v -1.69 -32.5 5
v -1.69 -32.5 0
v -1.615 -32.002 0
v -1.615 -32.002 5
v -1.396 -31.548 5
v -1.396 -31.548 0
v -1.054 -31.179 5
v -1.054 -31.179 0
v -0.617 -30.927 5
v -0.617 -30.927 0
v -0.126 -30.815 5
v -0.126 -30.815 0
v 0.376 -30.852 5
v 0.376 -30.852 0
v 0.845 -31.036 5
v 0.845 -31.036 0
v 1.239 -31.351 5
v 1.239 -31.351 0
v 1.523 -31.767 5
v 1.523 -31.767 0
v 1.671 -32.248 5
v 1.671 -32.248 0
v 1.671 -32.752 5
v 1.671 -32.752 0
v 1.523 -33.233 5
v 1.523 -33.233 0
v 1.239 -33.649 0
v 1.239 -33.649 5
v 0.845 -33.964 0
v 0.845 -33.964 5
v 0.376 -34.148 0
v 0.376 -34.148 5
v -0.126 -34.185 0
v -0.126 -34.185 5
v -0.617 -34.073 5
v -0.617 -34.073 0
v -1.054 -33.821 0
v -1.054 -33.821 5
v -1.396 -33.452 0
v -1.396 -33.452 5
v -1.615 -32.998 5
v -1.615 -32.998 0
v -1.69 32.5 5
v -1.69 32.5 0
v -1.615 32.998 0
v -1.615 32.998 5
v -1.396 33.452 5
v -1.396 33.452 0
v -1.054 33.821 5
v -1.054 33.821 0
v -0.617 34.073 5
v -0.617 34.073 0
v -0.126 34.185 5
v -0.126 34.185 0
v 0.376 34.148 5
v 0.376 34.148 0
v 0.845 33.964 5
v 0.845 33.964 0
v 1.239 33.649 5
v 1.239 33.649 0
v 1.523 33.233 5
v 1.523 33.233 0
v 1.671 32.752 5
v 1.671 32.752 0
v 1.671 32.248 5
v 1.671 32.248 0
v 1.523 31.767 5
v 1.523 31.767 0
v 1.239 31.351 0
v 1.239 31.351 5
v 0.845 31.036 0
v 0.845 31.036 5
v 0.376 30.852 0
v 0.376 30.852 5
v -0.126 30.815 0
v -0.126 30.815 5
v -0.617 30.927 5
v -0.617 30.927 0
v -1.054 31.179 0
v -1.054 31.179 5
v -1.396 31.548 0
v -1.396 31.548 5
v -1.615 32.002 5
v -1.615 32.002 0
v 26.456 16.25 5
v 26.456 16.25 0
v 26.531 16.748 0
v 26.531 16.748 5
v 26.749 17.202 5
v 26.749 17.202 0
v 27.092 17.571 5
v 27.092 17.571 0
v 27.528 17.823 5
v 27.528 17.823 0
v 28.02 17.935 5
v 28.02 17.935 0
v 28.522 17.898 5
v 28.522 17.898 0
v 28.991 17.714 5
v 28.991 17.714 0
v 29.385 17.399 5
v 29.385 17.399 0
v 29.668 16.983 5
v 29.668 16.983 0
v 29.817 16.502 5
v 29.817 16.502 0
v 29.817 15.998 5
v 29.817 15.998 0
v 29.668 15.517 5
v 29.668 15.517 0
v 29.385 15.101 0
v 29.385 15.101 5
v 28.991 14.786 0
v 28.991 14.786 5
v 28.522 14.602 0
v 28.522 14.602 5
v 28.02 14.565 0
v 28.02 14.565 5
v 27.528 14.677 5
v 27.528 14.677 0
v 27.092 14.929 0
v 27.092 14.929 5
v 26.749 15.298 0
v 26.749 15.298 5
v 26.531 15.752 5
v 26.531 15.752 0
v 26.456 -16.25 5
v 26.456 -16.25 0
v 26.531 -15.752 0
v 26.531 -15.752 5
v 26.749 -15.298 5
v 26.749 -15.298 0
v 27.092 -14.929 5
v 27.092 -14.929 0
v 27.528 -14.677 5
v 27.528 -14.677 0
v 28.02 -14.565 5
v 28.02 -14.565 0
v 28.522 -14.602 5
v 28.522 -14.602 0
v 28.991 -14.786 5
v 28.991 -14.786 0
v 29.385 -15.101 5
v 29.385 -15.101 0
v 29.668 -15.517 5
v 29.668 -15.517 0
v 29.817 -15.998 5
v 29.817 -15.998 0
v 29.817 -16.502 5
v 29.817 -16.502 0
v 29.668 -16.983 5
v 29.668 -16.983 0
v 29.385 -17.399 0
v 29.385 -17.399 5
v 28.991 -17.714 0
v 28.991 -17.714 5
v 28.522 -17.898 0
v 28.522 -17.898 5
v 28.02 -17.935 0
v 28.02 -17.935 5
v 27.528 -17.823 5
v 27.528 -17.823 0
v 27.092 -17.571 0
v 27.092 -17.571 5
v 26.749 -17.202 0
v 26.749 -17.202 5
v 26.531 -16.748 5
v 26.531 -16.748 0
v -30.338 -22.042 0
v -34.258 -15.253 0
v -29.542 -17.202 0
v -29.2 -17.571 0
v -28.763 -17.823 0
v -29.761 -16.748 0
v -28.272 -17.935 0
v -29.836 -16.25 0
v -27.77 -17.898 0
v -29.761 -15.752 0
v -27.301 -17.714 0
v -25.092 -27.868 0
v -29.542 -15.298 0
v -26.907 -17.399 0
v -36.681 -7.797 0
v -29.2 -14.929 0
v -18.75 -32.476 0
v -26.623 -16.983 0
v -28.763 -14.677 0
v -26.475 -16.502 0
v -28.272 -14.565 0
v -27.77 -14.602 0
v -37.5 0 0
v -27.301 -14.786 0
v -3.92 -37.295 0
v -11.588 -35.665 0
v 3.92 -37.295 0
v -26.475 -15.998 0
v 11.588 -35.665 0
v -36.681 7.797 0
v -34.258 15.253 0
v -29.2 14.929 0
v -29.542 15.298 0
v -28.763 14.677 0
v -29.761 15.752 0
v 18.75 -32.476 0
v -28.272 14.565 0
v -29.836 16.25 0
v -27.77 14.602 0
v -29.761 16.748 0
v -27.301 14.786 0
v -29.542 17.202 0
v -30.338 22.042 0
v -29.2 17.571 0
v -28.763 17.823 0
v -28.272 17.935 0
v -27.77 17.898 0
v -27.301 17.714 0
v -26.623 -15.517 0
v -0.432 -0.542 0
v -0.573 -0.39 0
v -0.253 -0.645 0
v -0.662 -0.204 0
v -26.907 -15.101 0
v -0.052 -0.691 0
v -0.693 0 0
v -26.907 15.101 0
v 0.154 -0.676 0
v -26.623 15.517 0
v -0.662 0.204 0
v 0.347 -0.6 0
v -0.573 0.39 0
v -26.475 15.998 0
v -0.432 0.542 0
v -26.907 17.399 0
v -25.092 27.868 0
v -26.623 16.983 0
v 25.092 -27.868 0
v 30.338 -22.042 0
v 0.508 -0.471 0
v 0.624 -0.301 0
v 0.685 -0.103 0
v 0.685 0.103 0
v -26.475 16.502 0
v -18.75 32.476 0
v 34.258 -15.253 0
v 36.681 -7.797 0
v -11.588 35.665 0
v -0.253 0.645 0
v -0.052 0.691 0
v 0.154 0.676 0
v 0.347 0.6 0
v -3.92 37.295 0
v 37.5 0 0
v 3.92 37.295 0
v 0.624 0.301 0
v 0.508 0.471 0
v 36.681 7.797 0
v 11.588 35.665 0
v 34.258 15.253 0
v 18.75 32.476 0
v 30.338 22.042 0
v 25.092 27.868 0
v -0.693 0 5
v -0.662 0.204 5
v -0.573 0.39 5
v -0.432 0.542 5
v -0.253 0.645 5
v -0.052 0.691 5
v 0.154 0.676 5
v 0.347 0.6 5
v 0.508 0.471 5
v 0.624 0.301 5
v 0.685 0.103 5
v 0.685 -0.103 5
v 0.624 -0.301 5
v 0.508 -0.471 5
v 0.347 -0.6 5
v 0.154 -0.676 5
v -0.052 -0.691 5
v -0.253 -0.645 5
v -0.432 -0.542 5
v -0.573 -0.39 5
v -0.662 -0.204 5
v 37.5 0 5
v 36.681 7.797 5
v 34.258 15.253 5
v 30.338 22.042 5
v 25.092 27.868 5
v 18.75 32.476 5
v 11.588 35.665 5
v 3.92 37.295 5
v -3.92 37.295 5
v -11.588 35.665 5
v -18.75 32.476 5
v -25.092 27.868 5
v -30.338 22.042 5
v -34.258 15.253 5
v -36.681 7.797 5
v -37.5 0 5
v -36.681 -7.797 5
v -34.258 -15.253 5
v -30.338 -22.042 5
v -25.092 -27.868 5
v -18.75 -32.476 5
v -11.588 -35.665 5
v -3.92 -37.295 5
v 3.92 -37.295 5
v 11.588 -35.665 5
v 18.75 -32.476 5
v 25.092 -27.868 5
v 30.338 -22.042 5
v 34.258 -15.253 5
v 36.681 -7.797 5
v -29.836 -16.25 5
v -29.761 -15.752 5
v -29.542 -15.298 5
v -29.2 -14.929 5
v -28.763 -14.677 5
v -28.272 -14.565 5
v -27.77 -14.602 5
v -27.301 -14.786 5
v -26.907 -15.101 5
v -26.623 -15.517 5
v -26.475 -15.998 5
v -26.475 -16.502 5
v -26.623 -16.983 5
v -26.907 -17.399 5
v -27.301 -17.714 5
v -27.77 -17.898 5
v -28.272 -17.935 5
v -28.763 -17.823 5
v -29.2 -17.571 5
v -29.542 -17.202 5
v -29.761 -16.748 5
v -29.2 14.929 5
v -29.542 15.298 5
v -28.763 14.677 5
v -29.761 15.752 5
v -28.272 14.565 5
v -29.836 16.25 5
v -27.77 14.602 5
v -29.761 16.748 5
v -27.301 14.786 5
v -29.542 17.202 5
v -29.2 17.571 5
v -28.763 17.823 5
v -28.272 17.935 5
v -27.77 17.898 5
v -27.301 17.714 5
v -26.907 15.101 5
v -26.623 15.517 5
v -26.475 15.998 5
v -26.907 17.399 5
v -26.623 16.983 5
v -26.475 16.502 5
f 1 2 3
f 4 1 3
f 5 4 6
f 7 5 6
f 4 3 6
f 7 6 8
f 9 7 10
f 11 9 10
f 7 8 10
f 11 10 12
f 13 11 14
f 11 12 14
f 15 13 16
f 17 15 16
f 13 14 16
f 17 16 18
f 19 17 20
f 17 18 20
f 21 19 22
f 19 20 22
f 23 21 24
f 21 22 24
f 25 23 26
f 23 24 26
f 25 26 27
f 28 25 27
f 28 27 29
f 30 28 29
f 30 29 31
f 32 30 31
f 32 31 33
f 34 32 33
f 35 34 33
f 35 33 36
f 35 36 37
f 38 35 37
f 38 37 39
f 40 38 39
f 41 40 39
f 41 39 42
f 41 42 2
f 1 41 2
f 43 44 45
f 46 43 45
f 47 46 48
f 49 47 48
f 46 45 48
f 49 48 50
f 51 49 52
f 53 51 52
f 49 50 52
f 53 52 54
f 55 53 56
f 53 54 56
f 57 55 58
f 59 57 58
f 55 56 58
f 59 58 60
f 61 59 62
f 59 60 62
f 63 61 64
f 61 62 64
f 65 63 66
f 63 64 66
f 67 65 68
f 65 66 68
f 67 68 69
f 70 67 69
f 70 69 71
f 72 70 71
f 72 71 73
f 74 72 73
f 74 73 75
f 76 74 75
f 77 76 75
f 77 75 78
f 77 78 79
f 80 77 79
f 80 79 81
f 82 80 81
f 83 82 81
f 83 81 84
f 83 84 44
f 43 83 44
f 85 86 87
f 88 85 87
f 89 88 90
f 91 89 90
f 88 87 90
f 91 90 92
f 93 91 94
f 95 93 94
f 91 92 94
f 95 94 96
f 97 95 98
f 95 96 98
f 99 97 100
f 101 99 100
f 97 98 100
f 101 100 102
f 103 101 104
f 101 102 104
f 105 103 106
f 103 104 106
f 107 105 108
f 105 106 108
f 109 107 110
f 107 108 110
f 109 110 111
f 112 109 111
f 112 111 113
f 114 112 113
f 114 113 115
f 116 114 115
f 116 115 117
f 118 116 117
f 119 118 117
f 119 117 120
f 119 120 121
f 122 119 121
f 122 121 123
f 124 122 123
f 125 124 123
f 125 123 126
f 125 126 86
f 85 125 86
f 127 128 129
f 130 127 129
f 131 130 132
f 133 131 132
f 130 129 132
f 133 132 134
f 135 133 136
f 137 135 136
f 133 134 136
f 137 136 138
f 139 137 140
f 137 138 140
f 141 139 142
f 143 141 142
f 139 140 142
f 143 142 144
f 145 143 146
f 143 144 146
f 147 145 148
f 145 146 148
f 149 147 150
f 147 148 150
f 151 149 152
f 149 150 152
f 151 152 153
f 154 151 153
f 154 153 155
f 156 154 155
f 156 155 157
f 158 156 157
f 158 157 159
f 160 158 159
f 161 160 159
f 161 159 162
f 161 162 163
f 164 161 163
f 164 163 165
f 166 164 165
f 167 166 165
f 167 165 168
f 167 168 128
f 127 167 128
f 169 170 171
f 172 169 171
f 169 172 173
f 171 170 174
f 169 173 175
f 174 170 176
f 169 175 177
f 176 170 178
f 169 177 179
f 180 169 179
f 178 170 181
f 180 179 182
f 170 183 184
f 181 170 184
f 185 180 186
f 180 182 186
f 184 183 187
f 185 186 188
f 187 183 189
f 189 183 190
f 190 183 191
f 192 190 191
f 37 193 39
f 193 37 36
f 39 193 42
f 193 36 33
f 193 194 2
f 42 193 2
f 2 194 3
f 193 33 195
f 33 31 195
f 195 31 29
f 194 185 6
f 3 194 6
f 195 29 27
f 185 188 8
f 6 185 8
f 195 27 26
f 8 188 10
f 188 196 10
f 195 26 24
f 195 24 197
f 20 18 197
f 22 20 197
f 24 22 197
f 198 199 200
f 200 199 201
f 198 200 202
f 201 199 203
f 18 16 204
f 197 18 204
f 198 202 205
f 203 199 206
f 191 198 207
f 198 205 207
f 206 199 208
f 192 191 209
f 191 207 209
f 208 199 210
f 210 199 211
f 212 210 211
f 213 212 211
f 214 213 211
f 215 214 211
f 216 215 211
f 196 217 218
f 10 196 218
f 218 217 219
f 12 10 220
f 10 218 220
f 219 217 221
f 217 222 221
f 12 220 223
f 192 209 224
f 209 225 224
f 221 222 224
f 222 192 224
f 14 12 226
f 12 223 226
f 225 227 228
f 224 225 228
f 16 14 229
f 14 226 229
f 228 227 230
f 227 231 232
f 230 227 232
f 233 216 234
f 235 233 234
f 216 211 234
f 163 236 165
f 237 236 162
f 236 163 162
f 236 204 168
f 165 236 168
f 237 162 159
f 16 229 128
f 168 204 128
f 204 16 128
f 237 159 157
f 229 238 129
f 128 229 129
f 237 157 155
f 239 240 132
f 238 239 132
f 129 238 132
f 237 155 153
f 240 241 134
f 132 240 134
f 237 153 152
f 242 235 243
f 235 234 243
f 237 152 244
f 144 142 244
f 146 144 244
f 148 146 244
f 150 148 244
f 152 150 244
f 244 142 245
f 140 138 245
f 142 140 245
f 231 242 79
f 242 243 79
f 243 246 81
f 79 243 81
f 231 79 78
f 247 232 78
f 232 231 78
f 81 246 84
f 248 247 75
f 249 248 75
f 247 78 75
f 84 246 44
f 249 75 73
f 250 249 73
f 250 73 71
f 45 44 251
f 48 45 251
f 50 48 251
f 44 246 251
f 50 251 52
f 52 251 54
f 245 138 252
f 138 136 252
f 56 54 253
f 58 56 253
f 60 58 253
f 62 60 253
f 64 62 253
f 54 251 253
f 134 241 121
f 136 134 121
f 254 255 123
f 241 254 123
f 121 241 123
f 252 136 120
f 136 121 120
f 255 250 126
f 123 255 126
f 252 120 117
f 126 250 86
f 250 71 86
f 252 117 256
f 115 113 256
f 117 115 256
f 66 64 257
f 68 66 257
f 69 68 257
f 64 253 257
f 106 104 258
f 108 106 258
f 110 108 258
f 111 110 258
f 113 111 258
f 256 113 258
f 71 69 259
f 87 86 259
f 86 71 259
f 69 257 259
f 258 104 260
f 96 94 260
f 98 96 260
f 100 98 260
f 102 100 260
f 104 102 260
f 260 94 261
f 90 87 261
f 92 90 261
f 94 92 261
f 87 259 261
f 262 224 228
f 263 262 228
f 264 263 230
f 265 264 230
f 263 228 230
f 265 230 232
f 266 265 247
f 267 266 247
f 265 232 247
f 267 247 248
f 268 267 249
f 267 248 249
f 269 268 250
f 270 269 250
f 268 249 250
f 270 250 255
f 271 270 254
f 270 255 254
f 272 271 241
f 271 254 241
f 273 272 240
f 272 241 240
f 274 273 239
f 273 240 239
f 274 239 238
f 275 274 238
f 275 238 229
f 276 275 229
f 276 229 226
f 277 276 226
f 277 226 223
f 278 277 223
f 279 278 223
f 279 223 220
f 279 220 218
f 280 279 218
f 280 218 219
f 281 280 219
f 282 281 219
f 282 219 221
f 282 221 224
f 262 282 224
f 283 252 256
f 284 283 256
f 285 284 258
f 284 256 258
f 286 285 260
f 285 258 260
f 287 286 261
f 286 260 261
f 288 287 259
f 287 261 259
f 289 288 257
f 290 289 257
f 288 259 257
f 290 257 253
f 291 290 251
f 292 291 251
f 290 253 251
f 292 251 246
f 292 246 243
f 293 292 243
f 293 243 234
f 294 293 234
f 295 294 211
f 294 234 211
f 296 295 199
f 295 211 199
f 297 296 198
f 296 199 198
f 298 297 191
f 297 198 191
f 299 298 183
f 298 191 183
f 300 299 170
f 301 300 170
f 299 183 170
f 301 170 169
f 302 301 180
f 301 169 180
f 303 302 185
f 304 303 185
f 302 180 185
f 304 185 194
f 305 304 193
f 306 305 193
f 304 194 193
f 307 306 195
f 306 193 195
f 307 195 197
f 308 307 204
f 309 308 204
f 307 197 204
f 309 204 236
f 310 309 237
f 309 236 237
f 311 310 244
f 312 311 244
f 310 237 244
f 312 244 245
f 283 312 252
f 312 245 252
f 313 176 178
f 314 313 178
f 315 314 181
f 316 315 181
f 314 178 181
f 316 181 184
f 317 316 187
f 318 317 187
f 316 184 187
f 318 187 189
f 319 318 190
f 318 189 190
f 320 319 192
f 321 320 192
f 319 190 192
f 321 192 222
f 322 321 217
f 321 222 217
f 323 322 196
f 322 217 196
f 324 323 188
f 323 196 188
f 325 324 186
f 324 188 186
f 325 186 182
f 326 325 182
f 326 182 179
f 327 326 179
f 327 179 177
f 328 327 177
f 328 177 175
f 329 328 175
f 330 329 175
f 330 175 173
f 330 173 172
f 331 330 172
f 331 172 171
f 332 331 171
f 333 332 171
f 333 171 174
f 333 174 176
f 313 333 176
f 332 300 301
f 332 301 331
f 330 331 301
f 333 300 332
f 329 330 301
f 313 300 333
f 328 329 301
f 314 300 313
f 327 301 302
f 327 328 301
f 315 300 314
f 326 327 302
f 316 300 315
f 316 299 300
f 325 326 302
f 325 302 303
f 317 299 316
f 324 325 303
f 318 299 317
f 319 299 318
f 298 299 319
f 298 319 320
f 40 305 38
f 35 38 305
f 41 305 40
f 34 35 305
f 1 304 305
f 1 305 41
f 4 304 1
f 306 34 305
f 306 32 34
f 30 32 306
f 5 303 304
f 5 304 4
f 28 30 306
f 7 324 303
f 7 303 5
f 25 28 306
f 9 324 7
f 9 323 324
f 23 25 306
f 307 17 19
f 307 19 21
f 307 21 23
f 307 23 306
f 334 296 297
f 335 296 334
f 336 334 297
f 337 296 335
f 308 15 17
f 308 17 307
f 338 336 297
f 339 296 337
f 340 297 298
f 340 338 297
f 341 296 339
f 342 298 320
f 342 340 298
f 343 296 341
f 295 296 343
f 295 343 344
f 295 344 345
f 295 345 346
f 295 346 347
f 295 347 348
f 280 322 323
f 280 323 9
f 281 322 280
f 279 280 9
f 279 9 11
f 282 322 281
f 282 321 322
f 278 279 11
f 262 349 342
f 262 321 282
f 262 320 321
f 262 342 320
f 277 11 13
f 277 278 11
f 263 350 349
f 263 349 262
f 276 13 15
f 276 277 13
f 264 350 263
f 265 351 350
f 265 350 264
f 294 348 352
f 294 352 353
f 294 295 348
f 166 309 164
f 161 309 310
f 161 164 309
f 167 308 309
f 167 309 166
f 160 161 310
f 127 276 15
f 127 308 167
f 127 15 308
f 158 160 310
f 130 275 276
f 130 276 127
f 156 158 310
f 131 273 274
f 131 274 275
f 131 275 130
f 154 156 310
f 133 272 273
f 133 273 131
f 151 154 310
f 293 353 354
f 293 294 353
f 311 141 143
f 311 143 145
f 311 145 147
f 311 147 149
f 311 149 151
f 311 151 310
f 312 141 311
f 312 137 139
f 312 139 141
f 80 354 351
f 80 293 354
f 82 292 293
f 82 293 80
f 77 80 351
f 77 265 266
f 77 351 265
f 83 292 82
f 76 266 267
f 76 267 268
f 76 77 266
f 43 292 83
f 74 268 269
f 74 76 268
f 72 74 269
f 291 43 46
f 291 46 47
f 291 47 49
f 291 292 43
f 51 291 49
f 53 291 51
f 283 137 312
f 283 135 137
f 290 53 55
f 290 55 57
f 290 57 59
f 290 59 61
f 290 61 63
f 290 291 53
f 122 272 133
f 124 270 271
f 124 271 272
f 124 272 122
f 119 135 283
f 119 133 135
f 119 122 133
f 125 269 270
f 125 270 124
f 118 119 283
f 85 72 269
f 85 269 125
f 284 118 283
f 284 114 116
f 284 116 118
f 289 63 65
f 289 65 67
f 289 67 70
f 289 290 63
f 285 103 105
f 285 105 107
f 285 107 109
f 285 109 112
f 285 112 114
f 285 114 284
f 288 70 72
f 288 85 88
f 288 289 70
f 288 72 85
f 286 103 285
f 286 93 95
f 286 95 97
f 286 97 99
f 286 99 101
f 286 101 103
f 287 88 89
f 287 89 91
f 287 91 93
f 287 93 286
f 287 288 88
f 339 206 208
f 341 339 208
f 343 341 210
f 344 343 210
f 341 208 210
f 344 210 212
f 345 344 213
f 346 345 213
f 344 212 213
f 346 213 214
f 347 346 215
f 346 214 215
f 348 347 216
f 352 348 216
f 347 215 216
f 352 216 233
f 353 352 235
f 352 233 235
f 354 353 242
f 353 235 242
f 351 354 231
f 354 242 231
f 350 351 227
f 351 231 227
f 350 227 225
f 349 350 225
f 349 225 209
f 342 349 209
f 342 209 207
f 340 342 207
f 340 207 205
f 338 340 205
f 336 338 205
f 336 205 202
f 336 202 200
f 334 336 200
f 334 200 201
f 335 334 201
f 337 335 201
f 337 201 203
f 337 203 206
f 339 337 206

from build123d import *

# Parameters (mm, degrees)
SKETCH1_R           = 37.5
BOSS_EXTRUDE1_DEPTH = 5
SKETCH2_R           = 0.693
CUT_EXTRUDE1_DEPTH  = 6
SKETCH3_R           = 1.69
CUT_EXTRUDE2_DEPTH  = 6


with BuildPart() as part:
    # Sketch1 → Boss-Extrude1 (new body)
    with BuildSketch(Plane.XY):
        Circle(SKETCH1_R)
    extrude(amount=BOSS_EXTRUDE1_DEPTH)

    # Sketch2 → Cut-Extrude1 (cut, through all)
    with BuildSketch(Plane(origin=(0, 0, 0), x_dir=(-1, 0, 0), z_dir=(0, 0, -1))):
        Circle(SKETCH2_R)
    extrude(amount=-CUT_EXTRUDE1_DEPTH, mode=Mode.SUBTRACT)

    # Sketch3 → Cut-Extrude2 (cut, through all)
    with BuildSketch(Plane(origin=(0, 0, 0), x_dir=(-1, 0, 0), z_dir=(0, 0, -1))):
        with Locations((0, 32.5)):
            Circle(SKETCH3_R)
        with Locations((28.145825623, 16.25)):
            Circle(SKETCH3_R)
        with Locations((28.145825623, -16.25)):
            Circle(SKETCH3_R)
        with Locations((0, -32.5)):
            Circle(SKETCH3_R)
        with Locations((-28.145825623, -16.25)):
            Circle(SKETCH3_R)
        with Locations((-28.145825623, 16.25)):
            Circle(SKETCH3_R)
    extrude(amount=-CUT_EXTRUDE2_DEPTH, mode=Mode.SUBTRACT)


solid = part.part
